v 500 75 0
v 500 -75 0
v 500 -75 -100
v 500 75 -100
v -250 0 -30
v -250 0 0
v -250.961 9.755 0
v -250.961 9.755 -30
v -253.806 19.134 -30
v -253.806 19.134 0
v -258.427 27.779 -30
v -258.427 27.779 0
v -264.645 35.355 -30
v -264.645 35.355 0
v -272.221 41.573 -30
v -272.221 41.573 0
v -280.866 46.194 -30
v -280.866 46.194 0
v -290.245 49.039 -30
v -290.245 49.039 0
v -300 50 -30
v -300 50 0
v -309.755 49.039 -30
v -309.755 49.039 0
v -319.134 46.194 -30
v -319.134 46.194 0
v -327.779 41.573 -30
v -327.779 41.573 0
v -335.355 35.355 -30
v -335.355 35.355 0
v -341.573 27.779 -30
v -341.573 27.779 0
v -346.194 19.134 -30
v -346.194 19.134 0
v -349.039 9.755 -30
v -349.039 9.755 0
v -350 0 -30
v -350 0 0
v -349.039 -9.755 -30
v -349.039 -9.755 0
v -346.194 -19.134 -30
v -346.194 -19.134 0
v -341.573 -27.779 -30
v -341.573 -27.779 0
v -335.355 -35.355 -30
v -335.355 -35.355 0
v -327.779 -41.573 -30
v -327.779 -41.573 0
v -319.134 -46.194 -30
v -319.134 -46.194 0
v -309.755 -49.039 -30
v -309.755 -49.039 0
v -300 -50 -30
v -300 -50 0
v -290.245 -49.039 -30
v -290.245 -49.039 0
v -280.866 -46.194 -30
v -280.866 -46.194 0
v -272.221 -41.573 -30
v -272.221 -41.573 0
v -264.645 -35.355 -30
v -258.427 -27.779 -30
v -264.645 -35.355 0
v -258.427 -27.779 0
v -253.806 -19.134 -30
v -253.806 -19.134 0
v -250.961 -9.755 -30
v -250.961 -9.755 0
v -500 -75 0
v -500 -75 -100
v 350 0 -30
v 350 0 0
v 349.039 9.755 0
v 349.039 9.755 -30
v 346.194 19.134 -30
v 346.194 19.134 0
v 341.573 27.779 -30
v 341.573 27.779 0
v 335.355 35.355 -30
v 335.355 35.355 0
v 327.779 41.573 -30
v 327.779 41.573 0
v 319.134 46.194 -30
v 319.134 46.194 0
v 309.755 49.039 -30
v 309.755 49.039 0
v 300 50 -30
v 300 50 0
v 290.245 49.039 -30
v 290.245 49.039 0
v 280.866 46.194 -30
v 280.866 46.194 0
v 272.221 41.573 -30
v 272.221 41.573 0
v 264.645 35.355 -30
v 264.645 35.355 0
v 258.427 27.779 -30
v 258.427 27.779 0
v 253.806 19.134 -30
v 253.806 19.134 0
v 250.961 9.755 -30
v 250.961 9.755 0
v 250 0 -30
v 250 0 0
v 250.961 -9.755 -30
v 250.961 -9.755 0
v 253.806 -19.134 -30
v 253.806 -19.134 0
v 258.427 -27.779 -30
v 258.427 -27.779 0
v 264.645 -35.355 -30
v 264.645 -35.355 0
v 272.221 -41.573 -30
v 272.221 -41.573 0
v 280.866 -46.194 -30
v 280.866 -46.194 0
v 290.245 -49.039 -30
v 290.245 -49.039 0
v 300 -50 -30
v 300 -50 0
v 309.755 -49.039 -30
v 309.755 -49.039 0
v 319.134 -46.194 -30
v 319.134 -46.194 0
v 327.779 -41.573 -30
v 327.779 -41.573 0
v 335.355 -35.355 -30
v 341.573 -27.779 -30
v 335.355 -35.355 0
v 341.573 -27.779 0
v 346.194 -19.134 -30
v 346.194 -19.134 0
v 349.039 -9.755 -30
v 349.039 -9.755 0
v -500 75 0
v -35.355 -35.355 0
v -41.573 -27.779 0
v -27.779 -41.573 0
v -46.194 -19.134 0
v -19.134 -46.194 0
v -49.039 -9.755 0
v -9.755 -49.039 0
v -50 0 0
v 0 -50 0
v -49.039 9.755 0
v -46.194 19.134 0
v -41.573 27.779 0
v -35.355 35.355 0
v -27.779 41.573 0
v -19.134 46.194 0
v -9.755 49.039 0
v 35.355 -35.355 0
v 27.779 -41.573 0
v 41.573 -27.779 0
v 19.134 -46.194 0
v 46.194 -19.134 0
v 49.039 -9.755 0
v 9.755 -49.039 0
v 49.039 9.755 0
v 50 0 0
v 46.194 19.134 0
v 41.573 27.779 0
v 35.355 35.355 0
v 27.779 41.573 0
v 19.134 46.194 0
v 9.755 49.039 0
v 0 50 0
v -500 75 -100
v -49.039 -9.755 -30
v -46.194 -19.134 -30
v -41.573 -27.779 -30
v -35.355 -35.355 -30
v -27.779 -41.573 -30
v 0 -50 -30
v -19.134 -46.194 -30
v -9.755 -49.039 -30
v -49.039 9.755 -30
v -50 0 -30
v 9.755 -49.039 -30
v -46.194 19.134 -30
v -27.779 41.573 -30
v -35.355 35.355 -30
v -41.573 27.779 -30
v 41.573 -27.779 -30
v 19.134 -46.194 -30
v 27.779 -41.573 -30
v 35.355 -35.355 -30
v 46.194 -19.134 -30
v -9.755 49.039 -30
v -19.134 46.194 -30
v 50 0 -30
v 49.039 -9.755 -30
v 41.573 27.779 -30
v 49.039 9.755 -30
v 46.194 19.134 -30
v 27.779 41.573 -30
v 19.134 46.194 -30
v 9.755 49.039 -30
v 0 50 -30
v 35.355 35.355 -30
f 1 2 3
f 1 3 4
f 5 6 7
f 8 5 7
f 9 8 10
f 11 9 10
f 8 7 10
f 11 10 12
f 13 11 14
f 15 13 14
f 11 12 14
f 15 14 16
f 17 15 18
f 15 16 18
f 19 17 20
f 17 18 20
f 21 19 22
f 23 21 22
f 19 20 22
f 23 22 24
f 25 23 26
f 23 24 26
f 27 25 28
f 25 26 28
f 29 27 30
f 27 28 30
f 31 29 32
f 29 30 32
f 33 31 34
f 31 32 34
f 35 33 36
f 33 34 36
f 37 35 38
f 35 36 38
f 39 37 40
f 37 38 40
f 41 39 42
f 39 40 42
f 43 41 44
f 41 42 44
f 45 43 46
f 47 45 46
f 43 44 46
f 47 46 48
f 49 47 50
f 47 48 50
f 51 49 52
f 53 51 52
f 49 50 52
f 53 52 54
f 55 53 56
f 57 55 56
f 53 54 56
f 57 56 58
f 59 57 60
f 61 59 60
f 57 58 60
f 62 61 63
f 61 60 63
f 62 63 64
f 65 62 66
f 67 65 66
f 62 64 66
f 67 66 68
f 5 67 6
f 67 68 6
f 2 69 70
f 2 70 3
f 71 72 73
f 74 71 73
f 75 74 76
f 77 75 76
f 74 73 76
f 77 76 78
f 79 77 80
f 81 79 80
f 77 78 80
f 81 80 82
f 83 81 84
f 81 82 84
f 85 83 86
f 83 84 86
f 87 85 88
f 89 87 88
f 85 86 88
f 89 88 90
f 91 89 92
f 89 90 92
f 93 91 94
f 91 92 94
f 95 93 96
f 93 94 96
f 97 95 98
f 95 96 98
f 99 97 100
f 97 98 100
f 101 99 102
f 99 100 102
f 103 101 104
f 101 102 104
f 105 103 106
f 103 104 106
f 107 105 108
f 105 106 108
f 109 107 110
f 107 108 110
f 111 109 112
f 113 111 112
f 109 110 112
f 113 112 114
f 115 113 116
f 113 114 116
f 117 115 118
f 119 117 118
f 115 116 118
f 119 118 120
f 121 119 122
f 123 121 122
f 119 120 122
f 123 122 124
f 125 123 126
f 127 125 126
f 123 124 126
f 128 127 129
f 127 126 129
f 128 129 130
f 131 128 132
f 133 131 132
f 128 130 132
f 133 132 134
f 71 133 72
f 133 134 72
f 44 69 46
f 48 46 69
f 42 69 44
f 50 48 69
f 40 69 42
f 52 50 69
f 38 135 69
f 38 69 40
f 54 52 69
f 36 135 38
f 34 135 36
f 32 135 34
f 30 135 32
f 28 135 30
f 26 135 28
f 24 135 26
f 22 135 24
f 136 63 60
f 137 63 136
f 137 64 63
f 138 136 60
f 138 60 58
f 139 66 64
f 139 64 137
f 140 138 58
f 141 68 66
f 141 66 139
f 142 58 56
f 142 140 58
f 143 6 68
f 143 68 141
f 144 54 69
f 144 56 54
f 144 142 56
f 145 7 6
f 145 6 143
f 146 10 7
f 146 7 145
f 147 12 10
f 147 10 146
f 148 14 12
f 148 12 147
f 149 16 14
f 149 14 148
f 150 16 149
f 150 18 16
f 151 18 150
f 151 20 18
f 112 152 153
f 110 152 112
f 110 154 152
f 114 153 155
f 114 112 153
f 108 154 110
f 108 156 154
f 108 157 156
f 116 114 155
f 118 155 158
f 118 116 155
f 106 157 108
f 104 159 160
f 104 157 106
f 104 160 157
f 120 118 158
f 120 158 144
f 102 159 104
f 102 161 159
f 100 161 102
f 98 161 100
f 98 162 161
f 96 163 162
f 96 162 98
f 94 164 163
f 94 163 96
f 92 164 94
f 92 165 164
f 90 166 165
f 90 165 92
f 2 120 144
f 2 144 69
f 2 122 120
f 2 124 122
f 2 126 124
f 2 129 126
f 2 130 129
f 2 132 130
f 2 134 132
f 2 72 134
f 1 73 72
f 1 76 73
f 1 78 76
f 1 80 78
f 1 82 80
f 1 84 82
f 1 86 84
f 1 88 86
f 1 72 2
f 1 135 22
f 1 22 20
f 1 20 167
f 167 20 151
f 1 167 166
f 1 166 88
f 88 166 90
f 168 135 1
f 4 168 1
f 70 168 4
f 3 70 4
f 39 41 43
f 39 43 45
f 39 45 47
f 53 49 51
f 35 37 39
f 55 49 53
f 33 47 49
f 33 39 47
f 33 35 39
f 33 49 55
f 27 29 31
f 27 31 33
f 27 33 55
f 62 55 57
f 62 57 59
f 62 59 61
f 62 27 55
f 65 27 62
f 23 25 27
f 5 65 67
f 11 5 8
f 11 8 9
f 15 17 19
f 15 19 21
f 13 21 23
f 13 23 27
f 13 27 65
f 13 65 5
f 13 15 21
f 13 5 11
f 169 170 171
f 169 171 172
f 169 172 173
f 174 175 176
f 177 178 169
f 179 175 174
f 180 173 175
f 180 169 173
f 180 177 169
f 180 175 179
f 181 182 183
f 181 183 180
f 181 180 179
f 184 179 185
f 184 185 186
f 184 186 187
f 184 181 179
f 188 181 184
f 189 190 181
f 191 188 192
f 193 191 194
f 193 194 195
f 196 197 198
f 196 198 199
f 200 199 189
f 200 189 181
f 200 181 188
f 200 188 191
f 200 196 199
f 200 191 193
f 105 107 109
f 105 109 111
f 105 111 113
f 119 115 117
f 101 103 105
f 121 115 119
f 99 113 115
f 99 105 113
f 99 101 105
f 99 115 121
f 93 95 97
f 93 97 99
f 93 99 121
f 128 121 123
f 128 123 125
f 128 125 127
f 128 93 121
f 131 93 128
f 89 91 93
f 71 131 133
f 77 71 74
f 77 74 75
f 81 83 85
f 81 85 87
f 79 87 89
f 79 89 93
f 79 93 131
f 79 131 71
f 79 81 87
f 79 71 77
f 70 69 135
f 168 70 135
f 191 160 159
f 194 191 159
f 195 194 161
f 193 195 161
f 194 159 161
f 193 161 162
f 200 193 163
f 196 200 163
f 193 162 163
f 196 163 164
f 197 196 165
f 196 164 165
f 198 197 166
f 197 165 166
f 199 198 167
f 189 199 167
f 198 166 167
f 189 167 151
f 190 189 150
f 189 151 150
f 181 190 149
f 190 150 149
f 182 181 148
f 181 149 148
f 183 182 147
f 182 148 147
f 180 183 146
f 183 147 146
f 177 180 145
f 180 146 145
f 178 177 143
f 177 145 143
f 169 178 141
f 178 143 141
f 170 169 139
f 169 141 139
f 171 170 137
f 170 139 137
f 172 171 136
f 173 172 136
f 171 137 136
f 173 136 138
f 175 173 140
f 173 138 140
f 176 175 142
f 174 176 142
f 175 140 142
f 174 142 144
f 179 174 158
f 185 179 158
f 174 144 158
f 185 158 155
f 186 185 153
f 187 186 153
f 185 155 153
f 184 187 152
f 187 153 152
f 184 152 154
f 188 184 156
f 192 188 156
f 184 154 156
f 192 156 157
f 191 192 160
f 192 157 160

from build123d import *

# Parameters (mm, degrees)
SKETCH2_W           = 1000
SKETCH2_H           = 150
BOSS_EXTRUDE2_DEPTH = 100
SKETCH2_5_R         = 50
CUT_EXTRUDE1_DEPTH  = 30


with BuildPart() as part:
    # Sketch2 → Boss-Extrude2 (new body)
    with BuildSketch(Plane.XY):
        Rectangle(SKETCH2_W, SKETCH2_H)
    extrude(amount=-BOSS_EXTRUDE2_DEPTH)

    # Sketch2<5> → Cut-Extrude1 (cut)
    with BuildSketch(Plane.XY):
        Circle(SKETCH2_5_R)
        with Locations((300, 0)):
            Circle(SKETCH2_5_R)
        with Locations((-300, 0)):
            Circle(SKETCH2_5_R)
    extrude(amount=-CUT_EXTRUDE1_DEPTH, mode=Mode.SUBTRACT)


solid = part.part
